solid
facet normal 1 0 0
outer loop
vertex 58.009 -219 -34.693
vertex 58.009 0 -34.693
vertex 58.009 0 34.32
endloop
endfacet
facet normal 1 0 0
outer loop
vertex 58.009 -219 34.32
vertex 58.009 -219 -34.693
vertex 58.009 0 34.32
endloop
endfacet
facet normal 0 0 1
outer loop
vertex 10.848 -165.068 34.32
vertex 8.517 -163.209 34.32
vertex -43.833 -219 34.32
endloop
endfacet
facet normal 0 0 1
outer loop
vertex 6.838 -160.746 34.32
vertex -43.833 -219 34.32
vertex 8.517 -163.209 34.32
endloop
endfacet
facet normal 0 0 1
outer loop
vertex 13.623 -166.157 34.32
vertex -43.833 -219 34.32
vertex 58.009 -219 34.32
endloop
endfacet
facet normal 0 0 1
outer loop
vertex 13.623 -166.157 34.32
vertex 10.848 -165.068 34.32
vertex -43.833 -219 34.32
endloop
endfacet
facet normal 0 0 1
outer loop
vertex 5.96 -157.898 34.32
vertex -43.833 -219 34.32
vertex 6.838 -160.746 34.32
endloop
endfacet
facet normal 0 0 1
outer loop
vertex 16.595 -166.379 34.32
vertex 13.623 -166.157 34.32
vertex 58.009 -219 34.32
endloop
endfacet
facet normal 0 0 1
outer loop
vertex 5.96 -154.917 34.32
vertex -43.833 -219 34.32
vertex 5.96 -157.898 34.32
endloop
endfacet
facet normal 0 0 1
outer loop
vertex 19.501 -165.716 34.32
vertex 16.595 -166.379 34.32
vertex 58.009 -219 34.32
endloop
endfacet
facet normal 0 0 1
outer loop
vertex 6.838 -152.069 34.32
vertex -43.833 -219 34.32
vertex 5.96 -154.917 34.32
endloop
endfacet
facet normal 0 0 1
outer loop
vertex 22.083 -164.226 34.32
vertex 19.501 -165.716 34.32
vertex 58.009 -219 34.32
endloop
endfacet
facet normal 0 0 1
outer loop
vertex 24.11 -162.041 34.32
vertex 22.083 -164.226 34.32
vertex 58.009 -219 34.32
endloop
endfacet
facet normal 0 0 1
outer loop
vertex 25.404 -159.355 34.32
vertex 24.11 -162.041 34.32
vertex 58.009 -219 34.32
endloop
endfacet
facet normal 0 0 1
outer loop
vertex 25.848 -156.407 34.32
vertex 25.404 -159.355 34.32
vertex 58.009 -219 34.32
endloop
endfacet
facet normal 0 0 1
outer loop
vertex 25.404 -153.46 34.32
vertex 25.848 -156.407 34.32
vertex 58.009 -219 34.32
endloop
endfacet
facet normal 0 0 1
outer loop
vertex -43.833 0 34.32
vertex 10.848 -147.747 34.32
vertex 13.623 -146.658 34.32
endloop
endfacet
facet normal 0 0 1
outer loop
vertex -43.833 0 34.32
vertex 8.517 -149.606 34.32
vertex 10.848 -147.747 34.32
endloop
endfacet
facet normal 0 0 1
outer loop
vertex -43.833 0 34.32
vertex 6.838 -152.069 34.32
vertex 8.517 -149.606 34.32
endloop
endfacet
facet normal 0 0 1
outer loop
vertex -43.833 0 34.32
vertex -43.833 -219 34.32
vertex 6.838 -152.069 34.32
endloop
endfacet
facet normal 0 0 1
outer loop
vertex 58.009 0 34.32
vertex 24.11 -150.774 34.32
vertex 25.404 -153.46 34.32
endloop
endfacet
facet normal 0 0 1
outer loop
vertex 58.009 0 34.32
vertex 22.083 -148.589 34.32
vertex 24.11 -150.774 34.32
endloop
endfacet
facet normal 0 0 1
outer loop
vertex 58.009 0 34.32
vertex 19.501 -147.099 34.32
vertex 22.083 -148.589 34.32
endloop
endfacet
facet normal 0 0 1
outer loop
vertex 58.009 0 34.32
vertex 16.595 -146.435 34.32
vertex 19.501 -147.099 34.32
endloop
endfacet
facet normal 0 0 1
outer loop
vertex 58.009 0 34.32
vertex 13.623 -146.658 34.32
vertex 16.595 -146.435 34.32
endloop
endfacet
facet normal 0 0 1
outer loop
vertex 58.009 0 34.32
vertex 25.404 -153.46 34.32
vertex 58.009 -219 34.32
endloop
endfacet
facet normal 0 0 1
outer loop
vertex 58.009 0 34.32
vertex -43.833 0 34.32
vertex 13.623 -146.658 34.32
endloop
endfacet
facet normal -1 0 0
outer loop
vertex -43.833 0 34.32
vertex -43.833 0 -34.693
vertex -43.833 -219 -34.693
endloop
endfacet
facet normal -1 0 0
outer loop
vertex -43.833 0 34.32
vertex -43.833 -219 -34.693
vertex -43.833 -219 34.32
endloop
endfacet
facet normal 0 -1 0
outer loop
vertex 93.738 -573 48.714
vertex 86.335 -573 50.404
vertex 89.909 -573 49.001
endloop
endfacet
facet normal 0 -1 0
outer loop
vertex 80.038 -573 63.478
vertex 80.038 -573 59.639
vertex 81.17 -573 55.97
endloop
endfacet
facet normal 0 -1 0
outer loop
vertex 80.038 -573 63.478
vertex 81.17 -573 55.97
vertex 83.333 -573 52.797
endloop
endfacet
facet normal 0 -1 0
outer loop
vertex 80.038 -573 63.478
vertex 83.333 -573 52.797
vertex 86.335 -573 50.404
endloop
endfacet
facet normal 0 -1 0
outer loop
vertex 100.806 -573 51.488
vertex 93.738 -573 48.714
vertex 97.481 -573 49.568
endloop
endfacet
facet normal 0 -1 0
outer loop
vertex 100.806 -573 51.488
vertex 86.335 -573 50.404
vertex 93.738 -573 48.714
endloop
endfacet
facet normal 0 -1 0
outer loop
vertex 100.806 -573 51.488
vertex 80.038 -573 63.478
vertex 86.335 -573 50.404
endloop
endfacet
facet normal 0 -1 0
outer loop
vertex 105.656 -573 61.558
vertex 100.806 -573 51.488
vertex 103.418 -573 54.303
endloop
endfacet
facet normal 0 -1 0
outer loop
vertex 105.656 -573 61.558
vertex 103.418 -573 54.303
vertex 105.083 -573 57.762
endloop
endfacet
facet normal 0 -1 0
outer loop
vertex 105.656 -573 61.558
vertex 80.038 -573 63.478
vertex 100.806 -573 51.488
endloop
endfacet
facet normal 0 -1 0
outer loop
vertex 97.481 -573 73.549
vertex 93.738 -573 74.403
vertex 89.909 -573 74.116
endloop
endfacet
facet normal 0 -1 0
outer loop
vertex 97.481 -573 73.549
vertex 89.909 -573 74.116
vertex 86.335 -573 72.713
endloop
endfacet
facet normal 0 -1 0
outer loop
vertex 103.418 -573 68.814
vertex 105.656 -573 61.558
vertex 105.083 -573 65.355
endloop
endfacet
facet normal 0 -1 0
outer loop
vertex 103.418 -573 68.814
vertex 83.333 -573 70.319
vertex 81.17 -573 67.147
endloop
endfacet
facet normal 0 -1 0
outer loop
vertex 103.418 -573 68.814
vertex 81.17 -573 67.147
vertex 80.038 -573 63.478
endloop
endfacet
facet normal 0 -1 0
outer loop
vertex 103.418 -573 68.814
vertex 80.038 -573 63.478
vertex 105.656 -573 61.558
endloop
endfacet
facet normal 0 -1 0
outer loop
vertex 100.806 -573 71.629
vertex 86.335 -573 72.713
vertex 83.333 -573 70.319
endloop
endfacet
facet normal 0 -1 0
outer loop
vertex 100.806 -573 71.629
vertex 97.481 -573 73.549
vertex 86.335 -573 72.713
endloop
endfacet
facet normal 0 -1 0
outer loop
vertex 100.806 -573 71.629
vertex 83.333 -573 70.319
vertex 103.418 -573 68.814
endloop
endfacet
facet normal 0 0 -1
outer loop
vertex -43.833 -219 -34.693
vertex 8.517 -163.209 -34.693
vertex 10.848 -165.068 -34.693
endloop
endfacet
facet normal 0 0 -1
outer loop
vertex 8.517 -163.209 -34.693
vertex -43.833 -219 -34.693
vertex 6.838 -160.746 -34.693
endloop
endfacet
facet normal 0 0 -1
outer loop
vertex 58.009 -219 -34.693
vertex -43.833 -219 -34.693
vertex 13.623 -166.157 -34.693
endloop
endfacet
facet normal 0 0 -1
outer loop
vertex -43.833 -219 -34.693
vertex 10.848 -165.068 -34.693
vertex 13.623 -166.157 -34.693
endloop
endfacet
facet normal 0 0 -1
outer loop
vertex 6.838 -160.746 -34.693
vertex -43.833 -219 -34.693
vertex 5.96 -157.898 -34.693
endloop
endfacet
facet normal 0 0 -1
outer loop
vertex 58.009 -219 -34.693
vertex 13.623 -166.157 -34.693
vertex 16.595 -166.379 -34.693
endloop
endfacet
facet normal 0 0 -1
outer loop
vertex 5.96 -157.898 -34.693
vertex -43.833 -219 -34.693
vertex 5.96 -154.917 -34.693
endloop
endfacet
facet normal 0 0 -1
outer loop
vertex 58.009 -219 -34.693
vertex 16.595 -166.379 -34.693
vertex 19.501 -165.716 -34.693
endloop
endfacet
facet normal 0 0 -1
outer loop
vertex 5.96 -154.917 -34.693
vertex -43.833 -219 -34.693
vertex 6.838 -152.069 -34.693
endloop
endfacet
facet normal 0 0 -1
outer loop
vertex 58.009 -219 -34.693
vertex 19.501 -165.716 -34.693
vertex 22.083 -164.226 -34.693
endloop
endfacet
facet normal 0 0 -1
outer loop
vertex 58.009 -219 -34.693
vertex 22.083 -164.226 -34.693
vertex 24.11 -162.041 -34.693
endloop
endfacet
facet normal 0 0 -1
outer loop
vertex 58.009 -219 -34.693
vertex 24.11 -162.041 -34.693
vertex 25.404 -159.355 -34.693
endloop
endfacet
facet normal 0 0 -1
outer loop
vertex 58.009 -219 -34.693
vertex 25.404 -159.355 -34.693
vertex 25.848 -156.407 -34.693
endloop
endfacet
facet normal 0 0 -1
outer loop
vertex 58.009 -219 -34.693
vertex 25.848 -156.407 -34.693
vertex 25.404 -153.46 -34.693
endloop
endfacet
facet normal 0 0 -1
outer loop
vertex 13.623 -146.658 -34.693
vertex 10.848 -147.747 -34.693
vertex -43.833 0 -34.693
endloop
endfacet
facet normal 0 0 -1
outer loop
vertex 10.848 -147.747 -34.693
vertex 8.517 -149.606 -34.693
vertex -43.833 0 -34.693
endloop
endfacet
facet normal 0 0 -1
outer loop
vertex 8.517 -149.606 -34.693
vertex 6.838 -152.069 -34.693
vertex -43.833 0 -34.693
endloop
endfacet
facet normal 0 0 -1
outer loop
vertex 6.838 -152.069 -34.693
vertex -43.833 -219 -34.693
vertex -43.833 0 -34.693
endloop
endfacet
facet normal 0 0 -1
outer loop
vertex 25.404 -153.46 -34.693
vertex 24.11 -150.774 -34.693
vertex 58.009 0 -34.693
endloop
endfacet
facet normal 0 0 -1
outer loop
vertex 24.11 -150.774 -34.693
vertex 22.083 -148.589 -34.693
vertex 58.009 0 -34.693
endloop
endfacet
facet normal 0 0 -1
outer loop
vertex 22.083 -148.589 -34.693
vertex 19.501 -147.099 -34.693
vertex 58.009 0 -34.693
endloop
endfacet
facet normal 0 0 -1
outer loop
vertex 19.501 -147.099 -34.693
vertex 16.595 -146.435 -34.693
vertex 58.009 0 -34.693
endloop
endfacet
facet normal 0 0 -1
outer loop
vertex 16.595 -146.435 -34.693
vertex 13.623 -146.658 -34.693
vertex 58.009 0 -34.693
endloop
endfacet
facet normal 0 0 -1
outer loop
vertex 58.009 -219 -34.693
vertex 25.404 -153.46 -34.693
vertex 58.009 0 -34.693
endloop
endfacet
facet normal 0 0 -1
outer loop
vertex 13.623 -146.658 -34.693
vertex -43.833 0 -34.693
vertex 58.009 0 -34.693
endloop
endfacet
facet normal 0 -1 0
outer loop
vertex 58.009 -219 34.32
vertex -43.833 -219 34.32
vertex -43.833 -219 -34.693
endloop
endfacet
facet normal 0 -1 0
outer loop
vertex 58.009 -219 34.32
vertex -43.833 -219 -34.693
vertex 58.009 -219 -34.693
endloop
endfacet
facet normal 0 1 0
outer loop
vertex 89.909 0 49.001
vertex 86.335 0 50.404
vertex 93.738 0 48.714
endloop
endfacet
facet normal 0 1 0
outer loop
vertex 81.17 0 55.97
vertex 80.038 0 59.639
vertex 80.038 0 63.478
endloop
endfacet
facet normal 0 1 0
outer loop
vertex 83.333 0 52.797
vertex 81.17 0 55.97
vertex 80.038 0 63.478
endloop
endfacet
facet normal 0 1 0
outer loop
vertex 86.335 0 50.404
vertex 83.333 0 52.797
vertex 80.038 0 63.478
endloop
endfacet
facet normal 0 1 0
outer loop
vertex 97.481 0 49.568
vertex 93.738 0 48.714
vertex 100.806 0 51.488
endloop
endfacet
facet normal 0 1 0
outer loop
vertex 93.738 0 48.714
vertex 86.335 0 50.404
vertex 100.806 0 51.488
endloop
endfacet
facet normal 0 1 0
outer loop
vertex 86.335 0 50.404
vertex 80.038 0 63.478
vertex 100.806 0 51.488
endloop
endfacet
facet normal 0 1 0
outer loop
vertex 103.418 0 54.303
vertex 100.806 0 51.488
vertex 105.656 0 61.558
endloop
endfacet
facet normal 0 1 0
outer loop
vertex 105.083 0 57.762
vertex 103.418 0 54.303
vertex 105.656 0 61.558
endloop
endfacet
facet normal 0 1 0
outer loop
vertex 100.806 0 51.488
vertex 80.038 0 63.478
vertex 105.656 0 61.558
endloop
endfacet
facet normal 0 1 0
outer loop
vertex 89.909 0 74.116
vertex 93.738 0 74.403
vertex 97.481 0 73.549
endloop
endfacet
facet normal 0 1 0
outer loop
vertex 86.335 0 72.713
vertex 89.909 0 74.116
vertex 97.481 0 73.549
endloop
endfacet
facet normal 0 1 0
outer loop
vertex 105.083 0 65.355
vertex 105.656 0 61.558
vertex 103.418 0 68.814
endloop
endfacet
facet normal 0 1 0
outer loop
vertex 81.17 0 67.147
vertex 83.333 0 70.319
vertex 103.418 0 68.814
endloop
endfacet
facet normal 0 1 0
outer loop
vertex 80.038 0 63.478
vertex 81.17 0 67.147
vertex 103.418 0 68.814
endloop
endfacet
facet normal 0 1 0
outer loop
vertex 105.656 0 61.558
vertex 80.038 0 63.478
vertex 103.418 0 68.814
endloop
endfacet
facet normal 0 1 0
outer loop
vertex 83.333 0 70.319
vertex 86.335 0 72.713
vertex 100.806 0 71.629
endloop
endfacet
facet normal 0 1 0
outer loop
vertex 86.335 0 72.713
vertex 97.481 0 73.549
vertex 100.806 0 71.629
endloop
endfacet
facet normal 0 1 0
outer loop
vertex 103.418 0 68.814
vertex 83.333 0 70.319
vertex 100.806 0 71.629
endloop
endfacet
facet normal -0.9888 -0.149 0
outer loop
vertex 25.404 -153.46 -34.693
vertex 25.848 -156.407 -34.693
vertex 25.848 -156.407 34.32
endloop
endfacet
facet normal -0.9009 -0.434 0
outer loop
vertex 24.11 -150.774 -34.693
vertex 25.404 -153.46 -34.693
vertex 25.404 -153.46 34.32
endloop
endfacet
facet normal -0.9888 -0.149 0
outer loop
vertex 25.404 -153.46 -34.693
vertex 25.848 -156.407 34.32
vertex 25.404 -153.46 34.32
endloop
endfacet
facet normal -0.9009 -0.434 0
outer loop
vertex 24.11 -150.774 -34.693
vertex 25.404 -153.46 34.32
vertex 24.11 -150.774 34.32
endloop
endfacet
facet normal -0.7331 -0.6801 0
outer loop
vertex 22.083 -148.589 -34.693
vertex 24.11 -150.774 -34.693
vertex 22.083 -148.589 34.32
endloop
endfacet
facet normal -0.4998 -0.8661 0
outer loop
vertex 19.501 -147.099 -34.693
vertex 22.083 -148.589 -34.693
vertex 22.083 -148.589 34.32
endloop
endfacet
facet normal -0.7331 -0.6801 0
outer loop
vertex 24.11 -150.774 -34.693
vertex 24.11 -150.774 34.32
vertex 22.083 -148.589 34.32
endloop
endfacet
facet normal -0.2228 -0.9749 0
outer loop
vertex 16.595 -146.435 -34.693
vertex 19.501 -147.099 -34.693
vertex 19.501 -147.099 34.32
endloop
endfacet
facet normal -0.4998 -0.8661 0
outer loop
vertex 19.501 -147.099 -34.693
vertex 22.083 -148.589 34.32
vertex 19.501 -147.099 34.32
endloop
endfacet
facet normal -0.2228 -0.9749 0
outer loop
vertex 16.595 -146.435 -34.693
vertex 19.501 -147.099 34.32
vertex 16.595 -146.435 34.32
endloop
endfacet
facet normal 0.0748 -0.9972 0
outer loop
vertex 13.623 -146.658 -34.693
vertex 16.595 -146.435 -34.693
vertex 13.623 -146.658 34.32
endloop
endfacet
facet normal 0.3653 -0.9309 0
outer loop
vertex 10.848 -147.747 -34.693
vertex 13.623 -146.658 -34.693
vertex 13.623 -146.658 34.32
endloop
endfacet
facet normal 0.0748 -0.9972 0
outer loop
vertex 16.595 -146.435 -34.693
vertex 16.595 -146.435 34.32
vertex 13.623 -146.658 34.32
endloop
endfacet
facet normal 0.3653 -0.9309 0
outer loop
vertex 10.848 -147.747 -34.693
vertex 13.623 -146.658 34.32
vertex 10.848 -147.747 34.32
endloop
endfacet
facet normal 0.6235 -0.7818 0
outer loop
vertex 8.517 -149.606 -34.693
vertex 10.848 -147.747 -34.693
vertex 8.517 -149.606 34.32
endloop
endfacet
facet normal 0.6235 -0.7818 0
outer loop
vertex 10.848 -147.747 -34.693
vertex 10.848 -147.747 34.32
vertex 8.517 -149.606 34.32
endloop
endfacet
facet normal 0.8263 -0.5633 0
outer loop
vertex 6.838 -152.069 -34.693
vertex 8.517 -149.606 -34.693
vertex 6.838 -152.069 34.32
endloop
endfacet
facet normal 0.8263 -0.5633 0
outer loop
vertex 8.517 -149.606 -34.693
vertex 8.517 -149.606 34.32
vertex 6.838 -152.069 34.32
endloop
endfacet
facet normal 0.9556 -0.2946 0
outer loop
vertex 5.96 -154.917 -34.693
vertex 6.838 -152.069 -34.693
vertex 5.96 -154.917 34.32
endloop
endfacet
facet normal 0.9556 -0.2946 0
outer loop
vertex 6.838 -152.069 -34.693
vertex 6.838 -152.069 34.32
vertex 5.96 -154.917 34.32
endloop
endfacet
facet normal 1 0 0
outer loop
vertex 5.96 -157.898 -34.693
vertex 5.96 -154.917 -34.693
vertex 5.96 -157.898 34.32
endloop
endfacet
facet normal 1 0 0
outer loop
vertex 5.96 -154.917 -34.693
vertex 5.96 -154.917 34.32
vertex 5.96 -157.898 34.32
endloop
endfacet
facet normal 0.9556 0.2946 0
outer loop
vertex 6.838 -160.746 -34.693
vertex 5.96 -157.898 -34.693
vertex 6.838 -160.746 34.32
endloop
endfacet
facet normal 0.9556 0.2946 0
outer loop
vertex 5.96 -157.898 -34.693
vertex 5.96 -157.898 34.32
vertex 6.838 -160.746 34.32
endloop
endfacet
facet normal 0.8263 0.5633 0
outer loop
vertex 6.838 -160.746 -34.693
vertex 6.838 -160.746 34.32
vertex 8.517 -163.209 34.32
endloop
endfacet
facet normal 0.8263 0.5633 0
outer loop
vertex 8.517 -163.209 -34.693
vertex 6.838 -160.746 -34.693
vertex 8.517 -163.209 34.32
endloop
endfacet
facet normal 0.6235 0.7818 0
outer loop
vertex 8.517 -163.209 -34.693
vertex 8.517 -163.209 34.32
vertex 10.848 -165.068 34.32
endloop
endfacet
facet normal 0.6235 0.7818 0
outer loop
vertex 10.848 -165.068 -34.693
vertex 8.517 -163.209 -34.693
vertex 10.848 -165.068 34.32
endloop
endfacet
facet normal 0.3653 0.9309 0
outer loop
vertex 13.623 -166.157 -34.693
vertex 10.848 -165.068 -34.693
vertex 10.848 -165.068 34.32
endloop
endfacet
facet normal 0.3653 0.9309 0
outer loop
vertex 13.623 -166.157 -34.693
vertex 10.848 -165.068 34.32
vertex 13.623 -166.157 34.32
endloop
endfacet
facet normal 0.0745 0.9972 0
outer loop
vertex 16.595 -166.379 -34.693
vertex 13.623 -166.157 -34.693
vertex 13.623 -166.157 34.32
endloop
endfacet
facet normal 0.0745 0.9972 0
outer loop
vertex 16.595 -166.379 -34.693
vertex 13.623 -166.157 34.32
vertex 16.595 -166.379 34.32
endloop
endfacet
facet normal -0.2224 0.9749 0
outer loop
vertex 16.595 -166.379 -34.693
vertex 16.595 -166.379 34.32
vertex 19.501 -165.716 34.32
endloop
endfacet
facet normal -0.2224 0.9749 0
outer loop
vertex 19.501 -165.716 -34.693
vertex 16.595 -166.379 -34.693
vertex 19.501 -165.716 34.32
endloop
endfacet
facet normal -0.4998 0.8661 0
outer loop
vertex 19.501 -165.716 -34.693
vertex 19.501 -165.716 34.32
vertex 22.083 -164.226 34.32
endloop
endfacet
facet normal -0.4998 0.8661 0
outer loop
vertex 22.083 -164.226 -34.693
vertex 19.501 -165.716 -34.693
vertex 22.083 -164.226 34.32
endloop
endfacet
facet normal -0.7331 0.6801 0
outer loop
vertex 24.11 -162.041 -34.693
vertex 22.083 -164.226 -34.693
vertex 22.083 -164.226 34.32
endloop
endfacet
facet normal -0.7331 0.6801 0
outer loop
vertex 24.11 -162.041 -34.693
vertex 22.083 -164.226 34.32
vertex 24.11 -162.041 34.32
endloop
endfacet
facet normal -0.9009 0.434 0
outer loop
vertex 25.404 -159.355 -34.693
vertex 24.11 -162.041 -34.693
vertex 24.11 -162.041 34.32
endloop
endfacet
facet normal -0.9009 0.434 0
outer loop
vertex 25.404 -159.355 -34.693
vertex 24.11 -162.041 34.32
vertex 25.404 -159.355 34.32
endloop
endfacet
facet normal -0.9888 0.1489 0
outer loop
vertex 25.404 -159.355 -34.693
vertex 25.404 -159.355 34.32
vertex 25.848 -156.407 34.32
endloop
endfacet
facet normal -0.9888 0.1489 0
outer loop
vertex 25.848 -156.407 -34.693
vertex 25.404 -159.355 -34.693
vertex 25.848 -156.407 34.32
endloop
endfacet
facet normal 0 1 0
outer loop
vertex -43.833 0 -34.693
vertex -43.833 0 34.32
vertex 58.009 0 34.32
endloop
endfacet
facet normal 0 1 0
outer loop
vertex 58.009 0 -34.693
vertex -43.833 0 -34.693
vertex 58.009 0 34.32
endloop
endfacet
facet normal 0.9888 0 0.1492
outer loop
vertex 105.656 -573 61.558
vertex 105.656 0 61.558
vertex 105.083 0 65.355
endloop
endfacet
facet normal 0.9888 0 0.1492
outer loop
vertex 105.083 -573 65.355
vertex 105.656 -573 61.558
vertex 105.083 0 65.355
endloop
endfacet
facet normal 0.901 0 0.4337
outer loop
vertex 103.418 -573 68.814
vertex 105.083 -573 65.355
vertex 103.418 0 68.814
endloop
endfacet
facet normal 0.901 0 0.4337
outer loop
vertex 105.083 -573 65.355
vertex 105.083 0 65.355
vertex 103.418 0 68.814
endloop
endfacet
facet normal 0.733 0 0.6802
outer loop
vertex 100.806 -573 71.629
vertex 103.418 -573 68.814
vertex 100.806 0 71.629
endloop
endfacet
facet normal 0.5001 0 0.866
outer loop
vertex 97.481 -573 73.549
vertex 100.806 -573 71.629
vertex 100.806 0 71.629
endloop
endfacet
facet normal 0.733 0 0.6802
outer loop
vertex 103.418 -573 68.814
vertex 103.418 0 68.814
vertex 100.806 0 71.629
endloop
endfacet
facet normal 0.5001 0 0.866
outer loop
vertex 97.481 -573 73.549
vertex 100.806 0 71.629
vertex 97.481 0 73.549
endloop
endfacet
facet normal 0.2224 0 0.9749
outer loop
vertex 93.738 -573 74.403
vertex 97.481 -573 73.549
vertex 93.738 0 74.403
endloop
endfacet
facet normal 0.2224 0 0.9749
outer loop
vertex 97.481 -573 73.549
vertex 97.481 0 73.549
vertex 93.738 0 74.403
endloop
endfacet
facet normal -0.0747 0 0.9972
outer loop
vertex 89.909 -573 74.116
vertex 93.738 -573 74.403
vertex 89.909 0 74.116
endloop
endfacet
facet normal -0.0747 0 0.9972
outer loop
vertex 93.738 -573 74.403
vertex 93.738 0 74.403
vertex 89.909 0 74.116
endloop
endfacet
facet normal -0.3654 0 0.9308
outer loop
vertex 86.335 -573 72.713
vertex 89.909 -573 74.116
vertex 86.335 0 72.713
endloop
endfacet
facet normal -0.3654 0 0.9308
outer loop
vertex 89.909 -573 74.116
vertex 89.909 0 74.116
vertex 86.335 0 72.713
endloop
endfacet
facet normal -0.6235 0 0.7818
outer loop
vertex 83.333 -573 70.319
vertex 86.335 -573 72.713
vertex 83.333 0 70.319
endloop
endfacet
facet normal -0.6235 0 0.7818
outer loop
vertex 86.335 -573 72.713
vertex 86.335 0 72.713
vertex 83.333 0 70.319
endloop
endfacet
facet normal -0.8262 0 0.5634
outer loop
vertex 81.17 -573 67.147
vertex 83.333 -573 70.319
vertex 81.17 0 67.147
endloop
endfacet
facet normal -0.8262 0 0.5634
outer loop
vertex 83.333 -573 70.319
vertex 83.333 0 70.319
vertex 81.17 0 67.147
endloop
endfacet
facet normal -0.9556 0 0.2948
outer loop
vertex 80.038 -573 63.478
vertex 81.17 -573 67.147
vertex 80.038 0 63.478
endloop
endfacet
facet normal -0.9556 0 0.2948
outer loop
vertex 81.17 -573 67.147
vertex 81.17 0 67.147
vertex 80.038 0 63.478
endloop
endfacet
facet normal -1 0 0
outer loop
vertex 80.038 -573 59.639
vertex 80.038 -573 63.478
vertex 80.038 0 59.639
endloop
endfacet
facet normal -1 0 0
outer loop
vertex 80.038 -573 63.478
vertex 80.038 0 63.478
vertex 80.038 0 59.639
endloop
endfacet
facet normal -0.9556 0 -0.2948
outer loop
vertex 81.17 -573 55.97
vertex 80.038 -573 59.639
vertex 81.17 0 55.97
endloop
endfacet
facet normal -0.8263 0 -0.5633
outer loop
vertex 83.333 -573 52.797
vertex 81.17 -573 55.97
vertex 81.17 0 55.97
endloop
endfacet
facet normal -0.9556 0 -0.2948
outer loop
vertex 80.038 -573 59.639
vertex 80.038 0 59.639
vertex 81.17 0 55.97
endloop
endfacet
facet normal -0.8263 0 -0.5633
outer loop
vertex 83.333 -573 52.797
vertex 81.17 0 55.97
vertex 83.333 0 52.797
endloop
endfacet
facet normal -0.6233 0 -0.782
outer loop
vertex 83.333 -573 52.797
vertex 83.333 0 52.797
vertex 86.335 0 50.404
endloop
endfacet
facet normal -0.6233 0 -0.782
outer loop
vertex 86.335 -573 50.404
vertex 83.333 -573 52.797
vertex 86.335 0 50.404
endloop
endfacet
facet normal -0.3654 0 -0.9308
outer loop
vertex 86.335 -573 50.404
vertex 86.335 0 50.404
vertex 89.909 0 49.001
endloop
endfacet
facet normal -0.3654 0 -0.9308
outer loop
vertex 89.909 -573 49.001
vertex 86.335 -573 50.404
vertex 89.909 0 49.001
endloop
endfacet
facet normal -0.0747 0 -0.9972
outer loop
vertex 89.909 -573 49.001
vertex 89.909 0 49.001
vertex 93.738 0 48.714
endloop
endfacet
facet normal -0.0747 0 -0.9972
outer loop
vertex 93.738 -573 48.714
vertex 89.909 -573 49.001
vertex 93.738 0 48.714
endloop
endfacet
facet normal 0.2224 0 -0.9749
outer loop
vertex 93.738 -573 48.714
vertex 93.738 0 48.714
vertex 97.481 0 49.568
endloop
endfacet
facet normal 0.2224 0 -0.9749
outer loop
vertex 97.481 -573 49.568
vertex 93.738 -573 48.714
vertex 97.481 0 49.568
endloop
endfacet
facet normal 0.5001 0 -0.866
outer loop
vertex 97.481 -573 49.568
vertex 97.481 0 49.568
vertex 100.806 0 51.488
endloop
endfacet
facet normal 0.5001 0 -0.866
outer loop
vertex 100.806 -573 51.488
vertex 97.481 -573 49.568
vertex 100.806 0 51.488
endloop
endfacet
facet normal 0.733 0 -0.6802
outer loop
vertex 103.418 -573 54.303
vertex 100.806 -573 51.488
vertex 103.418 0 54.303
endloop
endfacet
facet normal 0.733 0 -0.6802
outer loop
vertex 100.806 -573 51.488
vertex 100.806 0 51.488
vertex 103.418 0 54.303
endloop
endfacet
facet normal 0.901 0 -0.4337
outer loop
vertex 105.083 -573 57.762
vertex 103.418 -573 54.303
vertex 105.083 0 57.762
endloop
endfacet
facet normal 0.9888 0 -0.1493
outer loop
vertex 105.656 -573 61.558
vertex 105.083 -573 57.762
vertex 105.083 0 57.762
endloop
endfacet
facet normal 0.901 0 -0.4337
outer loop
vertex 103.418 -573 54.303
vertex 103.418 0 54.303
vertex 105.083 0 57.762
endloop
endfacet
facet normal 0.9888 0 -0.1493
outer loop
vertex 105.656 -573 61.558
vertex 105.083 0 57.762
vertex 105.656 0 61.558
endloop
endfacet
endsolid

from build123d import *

# Parameters (mm, degrees)
F0_W     = 101.842158
F0_H     = 69.013916
F1_DEPTH = 219
F2_R     = 12.880539
F3_DEPTH = 573
F4_R     = 10
F5_DEPTH = 69.014916


with BuildPart() as f1:
    # F0 (on Front) → F1 (new body)
    with BuildSketch(Plane.XZ):
        with Locations((7.087916, -0.186525)):
            Rectangle(F0_W, F0_H)
    extrude(amount=F1_DEPTH)

    # F4 (on face) → F5 (cut, through all)
    with BuildSketch(Plane.XY.offset(34.320433)):
        with Locations((15.848011, -156.407341)):
            Circle(F4_R)
    extrude(amount=-F5_DEPTH, mode=Mode.SUBTRACT)


with BuildPart() as f3:
    # F2 (on Front) → F3 (new body)
    with BuildSketch(Plane.XZ):
        with Locations((92.775121, 61.558418)):
            Circle(F2_R)
    extrude(amount=F3_DEPTH)


solid = Compound([f1.part, f3.part])
